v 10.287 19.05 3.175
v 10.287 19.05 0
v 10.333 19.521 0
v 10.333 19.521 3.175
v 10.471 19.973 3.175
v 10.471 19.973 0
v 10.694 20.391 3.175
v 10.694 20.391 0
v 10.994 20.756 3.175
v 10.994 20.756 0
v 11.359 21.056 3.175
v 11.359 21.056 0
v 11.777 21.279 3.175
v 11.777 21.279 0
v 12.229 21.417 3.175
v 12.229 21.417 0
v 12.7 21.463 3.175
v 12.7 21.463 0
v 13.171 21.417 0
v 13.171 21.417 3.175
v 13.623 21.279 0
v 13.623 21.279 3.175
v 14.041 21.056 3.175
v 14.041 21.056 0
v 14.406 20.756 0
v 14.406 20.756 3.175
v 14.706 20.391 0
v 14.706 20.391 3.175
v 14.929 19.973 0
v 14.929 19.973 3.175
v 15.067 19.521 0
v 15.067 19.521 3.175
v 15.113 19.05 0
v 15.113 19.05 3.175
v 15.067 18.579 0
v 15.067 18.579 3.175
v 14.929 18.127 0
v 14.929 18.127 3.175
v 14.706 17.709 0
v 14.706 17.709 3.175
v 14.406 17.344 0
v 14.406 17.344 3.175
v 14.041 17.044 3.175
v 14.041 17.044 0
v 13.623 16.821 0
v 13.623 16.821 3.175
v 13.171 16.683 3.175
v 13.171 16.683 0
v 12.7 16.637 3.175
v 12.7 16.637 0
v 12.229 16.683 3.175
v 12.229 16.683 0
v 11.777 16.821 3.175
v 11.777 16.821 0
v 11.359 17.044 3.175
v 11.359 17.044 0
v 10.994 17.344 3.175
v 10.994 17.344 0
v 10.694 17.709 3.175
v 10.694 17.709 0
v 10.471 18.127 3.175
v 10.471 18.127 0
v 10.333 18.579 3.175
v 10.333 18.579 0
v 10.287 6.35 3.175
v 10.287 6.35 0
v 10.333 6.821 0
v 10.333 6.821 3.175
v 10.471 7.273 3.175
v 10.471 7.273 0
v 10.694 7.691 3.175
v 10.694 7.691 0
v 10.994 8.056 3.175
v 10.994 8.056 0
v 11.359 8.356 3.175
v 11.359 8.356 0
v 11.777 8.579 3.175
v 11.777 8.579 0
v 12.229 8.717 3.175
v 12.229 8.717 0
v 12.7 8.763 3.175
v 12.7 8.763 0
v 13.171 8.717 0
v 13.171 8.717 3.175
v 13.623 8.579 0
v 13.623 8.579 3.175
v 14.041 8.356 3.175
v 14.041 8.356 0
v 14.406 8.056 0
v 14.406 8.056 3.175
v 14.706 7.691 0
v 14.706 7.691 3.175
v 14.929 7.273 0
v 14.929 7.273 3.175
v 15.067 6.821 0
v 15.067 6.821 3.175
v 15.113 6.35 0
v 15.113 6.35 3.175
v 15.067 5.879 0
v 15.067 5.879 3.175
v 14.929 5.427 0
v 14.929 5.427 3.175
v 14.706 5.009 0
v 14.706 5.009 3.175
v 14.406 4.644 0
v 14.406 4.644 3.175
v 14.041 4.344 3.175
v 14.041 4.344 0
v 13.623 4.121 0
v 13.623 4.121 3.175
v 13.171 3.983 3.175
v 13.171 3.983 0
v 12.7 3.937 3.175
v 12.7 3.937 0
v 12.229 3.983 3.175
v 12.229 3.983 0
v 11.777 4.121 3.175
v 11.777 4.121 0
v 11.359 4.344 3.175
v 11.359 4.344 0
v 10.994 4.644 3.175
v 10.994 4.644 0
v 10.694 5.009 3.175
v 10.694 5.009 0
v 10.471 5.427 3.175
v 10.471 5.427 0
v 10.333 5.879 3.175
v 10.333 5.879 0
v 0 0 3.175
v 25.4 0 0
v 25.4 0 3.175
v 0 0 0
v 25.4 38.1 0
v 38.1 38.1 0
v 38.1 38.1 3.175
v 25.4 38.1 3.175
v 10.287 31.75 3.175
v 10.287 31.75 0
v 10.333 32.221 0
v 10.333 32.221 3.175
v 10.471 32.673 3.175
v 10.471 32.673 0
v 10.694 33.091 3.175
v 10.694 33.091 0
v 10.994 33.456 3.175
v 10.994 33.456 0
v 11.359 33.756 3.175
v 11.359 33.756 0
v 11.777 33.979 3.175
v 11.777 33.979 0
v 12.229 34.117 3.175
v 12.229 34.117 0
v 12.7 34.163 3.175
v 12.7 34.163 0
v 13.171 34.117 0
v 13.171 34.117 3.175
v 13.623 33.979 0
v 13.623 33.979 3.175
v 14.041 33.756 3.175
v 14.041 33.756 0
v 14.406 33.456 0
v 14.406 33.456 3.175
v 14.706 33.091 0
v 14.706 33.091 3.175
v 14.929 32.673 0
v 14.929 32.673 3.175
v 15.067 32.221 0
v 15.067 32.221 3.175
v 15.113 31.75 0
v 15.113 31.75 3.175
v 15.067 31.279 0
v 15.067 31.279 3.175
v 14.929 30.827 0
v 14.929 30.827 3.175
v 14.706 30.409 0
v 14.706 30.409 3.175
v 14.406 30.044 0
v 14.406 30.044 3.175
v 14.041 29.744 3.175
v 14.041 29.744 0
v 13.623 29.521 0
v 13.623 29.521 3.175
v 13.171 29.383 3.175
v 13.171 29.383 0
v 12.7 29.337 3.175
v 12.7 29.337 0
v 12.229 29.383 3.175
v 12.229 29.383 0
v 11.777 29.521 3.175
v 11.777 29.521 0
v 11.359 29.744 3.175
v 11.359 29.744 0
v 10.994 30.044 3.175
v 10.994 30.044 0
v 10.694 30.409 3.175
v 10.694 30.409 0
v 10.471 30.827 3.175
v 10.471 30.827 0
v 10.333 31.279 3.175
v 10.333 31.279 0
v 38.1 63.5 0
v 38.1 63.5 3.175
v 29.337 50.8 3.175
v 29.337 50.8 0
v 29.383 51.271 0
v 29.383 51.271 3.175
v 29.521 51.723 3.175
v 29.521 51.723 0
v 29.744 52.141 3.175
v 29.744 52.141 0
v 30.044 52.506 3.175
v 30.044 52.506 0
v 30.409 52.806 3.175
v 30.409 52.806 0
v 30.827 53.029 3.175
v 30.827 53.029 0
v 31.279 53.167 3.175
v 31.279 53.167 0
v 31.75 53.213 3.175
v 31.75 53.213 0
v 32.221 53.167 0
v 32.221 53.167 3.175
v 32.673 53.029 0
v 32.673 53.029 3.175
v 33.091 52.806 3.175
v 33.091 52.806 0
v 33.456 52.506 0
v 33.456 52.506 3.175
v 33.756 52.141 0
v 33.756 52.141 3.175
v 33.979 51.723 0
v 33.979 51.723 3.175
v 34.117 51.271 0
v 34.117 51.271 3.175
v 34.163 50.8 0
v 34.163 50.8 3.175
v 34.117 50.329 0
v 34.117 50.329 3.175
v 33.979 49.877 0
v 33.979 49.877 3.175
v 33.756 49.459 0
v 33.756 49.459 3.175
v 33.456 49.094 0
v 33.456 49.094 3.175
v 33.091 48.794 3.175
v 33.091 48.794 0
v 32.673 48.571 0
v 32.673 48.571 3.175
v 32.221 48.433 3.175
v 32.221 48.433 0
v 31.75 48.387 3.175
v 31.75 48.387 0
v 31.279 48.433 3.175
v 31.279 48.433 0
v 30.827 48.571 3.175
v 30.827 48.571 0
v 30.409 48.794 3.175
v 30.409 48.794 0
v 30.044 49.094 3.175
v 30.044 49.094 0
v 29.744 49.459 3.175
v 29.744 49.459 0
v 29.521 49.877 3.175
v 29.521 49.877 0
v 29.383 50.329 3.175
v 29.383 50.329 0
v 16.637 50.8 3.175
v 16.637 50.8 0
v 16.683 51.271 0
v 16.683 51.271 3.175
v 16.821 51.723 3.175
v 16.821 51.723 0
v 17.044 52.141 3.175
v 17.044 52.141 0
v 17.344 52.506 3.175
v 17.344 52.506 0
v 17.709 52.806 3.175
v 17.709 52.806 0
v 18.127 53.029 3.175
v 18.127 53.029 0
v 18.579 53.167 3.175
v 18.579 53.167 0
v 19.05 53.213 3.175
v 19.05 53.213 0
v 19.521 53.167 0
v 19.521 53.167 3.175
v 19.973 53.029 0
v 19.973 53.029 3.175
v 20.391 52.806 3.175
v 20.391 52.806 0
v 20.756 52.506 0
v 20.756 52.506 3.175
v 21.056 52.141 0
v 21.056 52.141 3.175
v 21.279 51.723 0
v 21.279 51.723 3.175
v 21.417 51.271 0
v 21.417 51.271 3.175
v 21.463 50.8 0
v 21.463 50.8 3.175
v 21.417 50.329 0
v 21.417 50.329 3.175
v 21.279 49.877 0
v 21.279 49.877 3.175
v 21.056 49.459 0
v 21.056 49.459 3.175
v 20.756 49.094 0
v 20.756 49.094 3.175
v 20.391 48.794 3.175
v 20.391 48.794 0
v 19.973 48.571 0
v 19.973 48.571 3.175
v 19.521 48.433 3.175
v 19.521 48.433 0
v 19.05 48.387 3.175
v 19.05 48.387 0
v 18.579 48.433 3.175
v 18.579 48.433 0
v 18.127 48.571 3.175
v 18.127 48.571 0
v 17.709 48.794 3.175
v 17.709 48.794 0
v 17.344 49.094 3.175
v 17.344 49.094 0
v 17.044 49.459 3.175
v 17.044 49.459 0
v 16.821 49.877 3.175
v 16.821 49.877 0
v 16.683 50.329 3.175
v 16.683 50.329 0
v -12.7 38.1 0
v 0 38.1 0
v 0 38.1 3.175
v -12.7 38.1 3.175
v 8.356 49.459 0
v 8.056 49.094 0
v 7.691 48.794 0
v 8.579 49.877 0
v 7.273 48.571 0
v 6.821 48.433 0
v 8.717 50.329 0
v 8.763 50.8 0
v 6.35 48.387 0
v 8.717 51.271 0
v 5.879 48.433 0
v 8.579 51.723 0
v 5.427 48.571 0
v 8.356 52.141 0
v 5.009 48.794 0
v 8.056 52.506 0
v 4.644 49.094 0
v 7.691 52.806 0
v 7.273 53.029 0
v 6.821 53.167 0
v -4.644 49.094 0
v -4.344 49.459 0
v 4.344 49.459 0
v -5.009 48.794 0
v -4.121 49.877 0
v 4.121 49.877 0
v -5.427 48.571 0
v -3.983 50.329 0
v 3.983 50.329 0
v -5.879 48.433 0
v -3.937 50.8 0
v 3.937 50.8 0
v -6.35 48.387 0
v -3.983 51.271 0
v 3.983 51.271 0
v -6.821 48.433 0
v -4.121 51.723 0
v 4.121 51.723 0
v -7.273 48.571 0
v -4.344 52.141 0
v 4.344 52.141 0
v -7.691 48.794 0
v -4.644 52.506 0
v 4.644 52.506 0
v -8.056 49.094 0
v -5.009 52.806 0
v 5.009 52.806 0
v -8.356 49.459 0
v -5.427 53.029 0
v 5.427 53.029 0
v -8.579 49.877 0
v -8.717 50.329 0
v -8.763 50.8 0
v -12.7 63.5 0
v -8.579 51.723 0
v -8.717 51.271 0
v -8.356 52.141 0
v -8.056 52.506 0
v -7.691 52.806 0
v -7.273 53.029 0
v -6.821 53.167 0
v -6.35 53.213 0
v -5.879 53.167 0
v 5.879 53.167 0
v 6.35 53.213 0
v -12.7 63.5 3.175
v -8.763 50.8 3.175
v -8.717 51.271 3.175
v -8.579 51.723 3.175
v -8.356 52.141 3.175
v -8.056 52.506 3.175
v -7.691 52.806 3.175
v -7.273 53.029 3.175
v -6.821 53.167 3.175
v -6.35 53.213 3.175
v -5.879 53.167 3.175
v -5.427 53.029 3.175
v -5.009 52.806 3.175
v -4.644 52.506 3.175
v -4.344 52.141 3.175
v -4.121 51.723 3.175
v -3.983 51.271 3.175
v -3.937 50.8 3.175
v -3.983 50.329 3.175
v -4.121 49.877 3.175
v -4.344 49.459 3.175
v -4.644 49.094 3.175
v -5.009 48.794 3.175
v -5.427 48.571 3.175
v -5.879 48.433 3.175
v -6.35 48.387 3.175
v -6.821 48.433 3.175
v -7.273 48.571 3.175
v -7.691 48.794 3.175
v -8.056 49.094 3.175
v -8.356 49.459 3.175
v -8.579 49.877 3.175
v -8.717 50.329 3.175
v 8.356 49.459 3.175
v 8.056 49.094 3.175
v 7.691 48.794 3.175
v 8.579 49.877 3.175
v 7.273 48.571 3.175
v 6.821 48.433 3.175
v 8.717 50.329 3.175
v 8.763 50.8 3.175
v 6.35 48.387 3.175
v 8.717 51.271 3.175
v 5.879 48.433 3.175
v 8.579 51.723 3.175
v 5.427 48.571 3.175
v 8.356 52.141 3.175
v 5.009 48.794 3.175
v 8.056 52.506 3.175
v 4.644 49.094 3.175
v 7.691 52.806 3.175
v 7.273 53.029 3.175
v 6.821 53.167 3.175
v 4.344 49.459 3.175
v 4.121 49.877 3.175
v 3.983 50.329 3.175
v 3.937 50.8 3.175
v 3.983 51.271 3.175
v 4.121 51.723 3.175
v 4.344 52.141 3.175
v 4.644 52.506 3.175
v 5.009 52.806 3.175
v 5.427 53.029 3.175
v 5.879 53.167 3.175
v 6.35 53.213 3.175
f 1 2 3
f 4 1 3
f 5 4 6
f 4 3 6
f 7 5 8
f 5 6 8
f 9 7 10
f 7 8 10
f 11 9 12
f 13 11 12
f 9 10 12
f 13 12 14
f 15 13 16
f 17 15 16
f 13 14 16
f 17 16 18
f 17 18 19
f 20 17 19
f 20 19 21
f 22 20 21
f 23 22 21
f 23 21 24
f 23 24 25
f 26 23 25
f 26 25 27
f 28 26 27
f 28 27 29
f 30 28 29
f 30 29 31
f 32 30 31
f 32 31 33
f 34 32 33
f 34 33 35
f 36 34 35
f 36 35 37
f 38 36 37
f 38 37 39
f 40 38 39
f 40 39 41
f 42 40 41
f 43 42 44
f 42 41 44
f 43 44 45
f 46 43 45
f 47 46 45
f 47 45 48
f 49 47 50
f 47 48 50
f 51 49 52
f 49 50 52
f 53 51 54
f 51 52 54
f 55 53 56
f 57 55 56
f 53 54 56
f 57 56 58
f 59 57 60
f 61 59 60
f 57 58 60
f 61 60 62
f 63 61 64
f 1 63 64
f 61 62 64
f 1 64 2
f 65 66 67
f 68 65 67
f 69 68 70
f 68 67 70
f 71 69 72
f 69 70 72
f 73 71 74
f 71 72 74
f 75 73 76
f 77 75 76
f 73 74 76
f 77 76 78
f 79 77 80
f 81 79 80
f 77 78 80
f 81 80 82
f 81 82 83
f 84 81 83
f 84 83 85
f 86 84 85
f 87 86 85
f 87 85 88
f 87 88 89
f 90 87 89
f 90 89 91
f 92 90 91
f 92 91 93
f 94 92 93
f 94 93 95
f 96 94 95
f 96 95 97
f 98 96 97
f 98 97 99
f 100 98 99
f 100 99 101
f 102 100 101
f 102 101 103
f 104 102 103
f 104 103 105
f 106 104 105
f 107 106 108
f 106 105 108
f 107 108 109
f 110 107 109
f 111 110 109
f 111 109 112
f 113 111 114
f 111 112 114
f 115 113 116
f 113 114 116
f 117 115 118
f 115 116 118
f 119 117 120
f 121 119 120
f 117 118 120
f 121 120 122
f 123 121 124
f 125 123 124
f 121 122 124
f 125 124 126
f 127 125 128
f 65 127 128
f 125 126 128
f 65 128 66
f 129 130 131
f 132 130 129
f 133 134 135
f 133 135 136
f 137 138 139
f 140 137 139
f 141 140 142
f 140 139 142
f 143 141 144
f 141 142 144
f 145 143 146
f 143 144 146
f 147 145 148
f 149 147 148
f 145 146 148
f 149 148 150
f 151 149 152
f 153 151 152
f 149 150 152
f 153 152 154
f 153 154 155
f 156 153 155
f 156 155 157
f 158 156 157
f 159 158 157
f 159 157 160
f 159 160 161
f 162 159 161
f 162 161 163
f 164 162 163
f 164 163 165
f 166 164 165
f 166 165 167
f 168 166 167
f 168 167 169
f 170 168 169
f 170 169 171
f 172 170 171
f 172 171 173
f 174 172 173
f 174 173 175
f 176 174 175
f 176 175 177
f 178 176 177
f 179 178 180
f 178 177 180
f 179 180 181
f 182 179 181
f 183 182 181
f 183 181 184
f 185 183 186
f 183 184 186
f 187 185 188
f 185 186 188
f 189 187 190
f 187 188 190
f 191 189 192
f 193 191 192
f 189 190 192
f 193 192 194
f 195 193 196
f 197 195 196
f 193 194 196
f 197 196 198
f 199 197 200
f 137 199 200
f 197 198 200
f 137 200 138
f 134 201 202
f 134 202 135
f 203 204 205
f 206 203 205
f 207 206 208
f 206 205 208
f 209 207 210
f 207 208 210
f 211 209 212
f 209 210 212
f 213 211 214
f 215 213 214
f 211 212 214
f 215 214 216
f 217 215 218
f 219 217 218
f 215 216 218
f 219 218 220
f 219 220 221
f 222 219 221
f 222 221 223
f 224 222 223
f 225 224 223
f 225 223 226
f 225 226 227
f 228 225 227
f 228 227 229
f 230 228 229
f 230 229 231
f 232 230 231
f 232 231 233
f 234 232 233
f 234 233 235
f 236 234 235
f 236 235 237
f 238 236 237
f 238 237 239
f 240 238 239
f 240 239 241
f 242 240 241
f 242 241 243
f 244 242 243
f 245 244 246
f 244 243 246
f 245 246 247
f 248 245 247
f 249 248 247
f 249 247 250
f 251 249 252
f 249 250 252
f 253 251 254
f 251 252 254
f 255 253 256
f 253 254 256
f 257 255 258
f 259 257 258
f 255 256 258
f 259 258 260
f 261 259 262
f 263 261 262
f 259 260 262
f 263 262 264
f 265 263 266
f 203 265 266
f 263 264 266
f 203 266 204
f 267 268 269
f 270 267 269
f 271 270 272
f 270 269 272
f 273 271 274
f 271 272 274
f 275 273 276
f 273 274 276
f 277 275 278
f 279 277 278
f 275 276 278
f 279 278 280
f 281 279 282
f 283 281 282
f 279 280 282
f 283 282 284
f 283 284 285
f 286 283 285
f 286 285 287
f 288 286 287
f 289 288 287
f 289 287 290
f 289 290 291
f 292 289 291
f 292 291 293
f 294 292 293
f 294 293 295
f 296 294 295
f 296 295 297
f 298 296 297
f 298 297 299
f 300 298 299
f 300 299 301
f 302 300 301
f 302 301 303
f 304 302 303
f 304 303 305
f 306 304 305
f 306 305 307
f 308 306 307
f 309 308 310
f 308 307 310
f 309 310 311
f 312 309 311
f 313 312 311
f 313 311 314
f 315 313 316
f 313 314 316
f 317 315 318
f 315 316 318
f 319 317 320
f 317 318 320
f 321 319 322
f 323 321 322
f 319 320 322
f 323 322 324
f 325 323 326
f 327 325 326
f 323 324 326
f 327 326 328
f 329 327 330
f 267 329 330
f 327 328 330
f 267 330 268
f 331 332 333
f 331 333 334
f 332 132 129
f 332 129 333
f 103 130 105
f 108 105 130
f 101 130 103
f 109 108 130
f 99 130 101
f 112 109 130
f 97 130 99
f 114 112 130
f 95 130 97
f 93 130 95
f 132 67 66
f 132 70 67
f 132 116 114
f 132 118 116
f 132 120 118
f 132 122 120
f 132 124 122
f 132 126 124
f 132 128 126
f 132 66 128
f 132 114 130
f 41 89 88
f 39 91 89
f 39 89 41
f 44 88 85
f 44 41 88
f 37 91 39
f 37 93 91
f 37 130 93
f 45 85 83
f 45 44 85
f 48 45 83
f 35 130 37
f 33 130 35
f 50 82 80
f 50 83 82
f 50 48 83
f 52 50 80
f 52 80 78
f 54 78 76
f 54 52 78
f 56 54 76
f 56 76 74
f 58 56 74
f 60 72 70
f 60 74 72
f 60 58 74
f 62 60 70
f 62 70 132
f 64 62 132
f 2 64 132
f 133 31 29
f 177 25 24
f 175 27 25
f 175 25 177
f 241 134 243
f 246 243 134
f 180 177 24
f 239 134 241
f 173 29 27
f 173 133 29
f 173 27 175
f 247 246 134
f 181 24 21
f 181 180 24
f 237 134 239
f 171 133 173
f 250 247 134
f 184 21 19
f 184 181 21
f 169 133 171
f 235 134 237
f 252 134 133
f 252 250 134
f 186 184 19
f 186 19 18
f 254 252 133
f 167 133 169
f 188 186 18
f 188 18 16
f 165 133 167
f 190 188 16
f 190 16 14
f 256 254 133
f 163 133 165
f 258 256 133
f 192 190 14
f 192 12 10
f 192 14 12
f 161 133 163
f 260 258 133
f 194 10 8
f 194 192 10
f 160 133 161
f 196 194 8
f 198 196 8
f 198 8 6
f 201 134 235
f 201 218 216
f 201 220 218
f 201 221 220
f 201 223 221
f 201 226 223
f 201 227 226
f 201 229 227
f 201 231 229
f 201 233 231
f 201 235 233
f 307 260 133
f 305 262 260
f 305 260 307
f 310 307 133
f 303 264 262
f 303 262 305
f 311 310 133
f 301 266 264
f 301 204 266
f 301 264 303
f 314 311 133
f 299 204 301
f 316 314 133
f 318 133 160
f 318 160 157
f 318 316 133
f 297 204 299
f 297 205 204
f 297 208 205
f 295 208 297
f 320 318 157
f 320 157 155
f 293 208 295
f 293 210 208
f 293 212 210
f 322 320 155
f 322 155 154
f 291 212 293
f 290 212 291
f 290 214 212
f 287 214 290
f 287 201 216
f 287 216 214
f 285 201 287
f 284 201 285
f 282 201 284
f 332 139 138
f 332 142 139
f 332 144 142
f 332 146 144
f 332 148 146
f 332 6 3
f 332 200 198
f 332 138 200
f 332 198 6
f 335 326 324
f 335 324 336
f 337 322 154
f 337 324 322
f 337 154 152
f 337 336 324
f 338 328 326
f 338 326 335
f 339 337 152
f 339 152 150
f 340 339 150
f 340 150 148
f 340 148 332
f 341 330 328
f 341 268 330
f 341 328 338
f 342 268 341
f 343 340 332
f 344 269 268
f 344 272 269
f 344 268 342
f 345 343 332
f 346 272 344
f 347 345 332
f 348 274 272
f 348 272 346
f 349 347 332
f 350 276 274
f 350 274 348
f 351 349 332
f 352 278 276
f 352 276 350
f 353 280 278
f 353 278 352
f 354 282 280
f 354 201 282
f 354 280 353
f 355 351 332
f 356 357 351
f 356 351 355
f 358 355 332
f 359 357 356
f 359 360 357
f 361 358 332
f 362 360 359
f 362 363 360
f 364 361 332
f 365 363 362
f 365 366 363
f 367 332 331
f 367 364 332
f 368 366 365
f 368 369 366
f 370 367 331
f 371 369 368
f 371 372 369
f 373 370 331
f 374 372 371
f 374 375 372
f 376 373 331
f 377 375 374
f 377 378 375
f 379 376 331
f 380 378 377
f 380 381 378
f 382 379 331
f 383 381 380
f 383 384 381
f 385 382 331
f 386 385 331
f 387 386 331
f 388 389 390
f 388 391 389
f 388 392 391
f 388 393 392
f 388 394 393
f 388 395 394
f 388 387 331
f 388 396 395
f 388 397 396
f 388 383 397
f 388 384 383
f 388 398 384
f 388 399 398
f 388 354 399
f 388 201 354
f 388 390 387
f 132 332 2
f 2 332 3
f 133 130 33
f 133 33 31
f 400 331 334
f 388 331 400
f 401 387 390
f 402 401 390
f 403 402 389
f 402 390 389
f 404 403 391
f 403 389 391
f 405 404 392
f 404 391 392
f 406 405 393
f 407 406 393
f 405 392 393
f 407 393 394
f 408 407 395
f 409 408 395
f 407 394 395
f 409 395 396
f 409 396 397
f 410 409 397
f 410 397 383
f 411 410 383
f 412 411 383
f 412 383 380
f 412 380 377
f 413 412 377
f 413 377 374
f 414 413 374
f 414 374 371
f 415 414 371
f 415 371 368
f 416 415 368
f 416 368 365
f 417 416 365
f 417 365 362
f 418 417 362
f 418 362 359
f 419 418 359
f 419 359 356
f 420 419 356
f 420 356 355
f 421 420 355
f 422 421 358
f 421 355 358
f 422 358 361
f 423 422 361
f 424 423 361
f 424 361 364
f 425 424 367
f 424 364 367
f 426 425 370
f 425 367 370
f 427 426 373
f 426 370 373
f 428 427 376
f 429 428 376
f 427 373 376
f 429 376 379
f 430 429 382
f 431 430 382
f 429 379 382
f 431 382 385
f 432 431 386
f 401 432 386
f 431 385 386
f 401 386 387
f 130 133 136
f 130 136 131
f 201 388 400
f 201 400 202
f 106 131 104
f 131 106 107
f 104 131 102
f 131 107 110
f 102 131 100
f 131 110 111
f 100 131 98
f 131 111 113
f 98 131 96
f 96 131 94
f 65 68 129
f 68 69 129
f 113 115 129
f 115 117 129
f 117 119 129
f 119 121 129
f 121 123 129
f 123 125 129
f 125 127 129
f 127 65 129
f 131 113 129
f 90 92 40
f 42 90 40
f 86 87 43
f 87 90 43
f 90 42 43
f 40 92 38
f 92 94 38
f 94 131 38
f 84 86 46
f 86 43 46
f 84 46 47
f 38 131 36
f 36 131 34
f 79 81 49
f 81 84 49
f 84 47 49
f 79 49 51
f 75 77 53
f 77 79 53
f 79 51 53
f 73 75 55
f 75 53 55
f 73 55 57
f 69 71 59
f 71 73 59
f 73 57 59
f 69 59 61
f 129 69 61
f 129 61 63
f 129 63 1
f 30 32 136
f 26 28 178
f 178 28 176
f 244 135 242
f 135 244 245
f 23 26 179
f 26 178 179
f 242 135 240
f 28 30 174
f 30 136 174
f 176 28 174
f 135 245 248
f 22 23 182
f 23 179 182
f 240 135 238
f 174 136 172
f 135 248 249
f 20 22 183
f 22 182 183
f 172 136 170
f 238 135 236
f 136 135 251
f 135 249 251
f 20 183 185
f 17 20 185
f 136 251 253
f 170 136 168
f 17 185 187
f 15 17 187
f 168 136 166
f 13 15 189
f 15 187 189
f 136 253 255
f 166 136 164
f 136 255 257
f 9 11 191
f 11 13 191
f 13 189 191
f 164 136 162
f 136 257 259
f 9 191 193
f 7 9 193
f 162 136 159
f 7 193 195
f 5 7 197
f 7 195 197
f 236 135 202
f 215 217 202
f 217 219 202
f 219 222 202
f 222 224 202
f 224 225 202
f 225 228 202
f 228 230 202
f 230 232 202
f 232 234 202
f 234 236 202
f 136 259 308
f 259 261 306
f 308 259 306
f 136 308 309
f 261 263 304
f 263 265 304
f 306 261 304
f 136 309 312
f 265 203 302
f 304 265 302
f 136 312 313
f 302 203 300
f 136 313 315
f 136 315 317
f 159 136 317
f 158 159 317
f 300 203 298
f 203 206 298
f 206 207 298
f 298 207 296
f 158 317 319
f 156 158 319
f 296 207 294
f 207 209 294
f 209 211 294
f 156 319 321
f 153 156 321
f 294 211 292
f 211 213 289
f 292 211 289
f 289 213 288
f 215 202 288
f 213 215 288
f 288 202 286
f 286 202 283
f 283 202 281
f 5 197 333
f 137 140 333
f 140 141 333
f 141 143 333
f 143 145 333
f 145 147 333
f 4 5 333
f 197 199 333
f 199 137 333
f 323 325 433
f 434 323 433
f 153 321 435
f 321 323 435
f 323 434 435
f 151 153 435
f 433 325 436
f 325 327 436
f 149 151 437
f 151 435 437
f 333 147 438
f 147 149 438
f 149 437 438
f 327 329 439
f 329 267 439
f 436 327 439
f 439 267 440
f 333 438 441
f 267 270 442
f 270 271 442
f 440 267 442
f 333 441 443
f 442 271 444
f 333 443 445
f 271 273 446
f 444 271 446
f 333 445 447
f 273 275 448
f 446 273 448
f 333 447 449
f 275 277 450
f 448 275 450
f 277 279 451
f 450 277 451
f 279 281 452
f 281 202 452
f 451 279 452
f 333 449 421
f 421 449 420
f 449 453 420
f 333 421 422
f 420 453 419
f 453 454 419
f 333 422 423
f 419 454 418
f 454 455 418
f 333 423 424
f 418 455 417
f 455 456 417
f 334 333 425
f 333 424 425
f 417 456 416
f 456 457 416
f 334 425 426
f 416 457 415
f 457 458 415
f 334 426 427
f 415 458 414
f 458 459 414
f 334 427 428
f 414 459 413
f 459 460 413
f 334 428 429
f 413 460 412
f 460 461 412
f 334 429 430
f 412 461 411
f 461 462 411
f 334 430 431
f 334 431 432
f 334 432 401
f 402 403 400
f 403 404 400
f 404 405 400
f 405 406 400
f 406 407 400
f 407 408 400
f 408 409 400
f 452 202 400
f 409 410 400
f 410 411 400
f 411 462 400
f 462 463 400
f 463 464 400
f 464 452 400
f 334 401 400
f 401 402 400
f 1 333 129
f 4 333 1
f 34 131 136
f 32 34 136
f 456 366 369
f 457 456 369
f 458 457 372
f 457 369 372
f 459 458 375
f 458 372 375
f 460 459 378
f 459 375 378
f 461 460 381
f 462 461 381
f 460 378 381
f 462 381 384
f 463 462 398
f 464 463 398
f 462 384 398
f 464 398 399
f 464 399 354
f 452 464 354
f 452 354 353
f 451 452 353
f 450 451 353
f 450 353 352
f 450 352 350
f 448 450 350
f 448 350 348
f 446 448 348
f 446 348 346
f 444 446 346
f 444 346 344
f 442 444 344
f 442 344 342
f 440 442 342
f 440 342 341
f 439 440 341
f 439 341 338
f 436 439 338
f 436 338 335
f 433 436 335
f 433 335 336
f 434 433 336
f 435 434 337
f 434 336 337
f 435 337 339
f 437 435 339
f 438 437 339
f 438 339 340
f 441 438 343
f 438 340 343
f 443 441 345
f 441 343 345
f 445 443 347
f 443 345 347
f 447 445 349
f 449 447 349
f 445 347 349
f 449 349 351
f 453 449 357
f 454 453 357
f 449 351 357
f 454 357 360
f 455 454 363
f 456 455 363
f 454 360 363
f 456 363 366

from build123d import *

# Parameters (mm, degrees)
BOSS_EXTRUDE1_DEPTH = 3.175
SKETCH2_R           = 2.413
CUT_EXTRUDE1_DEPTH  = 75.121121315
SKETCH3_R           = 2.413
CUT_EXTRUDE2_DEPTH  = 75.121121315


with BuildPart() as part:
    # Sketch1 → Boss-Extrude1 (new body)
    with BuildSketch(Plane.XY):
        Polygon((0, 0), (0, 38.1), (-12.7, 38.1), (-12.7, 63.5), (38.1, 63.5), (38.1, 38.1), (25.4, 38.1), (25.4, 0), align=None)
    extrude(amount=BOSS_EXTRUDE1_DEPTH)

    # Sketch2 → Cut-Extrude1 (cut, through all)
    with BuildSketch(Plane(origin=(0, 0, 0), x_dir=(-1, 0, 0), z_dir=(0, 0, -1))):
        with Locations((-19.05, 50.8)):
            Circle(SKETCH2_R)
        with Locations((-6.35, 50.8)):
            Circle(SKETCH2_R)
        with Locations((6.35, 50.8)):
            Circle(SKETCH2_R)
        with Locations((-31.75, 50.8)):
            Circle(SKETCH2_R)
    extrude(amount=-CUT_EXTRUDE1_DEPTH, mode=Mode.SUBTRACT)

    # Sketch3 → Cut-Extrude2 (cut, through all)
    with BuildSketch(Plane(origin=(0, 0, 0), x_dir=(-1, 0, 0), z_dir=(0, 0, -1))):
        with Locations((-12.7, 19.05)):
            Circle(SKETCH3_R)
        with Locations((-12.7, 31.75)):
            Circle(SKETCH3_R)
        with Locations((-12.7, 6.35)):
            Circle(SKETCH3_R)
    extrude(amount=-CUT_EXTRUDE2_DEPTH, mode=Mode.SUBTRACT)


solid = part.part
